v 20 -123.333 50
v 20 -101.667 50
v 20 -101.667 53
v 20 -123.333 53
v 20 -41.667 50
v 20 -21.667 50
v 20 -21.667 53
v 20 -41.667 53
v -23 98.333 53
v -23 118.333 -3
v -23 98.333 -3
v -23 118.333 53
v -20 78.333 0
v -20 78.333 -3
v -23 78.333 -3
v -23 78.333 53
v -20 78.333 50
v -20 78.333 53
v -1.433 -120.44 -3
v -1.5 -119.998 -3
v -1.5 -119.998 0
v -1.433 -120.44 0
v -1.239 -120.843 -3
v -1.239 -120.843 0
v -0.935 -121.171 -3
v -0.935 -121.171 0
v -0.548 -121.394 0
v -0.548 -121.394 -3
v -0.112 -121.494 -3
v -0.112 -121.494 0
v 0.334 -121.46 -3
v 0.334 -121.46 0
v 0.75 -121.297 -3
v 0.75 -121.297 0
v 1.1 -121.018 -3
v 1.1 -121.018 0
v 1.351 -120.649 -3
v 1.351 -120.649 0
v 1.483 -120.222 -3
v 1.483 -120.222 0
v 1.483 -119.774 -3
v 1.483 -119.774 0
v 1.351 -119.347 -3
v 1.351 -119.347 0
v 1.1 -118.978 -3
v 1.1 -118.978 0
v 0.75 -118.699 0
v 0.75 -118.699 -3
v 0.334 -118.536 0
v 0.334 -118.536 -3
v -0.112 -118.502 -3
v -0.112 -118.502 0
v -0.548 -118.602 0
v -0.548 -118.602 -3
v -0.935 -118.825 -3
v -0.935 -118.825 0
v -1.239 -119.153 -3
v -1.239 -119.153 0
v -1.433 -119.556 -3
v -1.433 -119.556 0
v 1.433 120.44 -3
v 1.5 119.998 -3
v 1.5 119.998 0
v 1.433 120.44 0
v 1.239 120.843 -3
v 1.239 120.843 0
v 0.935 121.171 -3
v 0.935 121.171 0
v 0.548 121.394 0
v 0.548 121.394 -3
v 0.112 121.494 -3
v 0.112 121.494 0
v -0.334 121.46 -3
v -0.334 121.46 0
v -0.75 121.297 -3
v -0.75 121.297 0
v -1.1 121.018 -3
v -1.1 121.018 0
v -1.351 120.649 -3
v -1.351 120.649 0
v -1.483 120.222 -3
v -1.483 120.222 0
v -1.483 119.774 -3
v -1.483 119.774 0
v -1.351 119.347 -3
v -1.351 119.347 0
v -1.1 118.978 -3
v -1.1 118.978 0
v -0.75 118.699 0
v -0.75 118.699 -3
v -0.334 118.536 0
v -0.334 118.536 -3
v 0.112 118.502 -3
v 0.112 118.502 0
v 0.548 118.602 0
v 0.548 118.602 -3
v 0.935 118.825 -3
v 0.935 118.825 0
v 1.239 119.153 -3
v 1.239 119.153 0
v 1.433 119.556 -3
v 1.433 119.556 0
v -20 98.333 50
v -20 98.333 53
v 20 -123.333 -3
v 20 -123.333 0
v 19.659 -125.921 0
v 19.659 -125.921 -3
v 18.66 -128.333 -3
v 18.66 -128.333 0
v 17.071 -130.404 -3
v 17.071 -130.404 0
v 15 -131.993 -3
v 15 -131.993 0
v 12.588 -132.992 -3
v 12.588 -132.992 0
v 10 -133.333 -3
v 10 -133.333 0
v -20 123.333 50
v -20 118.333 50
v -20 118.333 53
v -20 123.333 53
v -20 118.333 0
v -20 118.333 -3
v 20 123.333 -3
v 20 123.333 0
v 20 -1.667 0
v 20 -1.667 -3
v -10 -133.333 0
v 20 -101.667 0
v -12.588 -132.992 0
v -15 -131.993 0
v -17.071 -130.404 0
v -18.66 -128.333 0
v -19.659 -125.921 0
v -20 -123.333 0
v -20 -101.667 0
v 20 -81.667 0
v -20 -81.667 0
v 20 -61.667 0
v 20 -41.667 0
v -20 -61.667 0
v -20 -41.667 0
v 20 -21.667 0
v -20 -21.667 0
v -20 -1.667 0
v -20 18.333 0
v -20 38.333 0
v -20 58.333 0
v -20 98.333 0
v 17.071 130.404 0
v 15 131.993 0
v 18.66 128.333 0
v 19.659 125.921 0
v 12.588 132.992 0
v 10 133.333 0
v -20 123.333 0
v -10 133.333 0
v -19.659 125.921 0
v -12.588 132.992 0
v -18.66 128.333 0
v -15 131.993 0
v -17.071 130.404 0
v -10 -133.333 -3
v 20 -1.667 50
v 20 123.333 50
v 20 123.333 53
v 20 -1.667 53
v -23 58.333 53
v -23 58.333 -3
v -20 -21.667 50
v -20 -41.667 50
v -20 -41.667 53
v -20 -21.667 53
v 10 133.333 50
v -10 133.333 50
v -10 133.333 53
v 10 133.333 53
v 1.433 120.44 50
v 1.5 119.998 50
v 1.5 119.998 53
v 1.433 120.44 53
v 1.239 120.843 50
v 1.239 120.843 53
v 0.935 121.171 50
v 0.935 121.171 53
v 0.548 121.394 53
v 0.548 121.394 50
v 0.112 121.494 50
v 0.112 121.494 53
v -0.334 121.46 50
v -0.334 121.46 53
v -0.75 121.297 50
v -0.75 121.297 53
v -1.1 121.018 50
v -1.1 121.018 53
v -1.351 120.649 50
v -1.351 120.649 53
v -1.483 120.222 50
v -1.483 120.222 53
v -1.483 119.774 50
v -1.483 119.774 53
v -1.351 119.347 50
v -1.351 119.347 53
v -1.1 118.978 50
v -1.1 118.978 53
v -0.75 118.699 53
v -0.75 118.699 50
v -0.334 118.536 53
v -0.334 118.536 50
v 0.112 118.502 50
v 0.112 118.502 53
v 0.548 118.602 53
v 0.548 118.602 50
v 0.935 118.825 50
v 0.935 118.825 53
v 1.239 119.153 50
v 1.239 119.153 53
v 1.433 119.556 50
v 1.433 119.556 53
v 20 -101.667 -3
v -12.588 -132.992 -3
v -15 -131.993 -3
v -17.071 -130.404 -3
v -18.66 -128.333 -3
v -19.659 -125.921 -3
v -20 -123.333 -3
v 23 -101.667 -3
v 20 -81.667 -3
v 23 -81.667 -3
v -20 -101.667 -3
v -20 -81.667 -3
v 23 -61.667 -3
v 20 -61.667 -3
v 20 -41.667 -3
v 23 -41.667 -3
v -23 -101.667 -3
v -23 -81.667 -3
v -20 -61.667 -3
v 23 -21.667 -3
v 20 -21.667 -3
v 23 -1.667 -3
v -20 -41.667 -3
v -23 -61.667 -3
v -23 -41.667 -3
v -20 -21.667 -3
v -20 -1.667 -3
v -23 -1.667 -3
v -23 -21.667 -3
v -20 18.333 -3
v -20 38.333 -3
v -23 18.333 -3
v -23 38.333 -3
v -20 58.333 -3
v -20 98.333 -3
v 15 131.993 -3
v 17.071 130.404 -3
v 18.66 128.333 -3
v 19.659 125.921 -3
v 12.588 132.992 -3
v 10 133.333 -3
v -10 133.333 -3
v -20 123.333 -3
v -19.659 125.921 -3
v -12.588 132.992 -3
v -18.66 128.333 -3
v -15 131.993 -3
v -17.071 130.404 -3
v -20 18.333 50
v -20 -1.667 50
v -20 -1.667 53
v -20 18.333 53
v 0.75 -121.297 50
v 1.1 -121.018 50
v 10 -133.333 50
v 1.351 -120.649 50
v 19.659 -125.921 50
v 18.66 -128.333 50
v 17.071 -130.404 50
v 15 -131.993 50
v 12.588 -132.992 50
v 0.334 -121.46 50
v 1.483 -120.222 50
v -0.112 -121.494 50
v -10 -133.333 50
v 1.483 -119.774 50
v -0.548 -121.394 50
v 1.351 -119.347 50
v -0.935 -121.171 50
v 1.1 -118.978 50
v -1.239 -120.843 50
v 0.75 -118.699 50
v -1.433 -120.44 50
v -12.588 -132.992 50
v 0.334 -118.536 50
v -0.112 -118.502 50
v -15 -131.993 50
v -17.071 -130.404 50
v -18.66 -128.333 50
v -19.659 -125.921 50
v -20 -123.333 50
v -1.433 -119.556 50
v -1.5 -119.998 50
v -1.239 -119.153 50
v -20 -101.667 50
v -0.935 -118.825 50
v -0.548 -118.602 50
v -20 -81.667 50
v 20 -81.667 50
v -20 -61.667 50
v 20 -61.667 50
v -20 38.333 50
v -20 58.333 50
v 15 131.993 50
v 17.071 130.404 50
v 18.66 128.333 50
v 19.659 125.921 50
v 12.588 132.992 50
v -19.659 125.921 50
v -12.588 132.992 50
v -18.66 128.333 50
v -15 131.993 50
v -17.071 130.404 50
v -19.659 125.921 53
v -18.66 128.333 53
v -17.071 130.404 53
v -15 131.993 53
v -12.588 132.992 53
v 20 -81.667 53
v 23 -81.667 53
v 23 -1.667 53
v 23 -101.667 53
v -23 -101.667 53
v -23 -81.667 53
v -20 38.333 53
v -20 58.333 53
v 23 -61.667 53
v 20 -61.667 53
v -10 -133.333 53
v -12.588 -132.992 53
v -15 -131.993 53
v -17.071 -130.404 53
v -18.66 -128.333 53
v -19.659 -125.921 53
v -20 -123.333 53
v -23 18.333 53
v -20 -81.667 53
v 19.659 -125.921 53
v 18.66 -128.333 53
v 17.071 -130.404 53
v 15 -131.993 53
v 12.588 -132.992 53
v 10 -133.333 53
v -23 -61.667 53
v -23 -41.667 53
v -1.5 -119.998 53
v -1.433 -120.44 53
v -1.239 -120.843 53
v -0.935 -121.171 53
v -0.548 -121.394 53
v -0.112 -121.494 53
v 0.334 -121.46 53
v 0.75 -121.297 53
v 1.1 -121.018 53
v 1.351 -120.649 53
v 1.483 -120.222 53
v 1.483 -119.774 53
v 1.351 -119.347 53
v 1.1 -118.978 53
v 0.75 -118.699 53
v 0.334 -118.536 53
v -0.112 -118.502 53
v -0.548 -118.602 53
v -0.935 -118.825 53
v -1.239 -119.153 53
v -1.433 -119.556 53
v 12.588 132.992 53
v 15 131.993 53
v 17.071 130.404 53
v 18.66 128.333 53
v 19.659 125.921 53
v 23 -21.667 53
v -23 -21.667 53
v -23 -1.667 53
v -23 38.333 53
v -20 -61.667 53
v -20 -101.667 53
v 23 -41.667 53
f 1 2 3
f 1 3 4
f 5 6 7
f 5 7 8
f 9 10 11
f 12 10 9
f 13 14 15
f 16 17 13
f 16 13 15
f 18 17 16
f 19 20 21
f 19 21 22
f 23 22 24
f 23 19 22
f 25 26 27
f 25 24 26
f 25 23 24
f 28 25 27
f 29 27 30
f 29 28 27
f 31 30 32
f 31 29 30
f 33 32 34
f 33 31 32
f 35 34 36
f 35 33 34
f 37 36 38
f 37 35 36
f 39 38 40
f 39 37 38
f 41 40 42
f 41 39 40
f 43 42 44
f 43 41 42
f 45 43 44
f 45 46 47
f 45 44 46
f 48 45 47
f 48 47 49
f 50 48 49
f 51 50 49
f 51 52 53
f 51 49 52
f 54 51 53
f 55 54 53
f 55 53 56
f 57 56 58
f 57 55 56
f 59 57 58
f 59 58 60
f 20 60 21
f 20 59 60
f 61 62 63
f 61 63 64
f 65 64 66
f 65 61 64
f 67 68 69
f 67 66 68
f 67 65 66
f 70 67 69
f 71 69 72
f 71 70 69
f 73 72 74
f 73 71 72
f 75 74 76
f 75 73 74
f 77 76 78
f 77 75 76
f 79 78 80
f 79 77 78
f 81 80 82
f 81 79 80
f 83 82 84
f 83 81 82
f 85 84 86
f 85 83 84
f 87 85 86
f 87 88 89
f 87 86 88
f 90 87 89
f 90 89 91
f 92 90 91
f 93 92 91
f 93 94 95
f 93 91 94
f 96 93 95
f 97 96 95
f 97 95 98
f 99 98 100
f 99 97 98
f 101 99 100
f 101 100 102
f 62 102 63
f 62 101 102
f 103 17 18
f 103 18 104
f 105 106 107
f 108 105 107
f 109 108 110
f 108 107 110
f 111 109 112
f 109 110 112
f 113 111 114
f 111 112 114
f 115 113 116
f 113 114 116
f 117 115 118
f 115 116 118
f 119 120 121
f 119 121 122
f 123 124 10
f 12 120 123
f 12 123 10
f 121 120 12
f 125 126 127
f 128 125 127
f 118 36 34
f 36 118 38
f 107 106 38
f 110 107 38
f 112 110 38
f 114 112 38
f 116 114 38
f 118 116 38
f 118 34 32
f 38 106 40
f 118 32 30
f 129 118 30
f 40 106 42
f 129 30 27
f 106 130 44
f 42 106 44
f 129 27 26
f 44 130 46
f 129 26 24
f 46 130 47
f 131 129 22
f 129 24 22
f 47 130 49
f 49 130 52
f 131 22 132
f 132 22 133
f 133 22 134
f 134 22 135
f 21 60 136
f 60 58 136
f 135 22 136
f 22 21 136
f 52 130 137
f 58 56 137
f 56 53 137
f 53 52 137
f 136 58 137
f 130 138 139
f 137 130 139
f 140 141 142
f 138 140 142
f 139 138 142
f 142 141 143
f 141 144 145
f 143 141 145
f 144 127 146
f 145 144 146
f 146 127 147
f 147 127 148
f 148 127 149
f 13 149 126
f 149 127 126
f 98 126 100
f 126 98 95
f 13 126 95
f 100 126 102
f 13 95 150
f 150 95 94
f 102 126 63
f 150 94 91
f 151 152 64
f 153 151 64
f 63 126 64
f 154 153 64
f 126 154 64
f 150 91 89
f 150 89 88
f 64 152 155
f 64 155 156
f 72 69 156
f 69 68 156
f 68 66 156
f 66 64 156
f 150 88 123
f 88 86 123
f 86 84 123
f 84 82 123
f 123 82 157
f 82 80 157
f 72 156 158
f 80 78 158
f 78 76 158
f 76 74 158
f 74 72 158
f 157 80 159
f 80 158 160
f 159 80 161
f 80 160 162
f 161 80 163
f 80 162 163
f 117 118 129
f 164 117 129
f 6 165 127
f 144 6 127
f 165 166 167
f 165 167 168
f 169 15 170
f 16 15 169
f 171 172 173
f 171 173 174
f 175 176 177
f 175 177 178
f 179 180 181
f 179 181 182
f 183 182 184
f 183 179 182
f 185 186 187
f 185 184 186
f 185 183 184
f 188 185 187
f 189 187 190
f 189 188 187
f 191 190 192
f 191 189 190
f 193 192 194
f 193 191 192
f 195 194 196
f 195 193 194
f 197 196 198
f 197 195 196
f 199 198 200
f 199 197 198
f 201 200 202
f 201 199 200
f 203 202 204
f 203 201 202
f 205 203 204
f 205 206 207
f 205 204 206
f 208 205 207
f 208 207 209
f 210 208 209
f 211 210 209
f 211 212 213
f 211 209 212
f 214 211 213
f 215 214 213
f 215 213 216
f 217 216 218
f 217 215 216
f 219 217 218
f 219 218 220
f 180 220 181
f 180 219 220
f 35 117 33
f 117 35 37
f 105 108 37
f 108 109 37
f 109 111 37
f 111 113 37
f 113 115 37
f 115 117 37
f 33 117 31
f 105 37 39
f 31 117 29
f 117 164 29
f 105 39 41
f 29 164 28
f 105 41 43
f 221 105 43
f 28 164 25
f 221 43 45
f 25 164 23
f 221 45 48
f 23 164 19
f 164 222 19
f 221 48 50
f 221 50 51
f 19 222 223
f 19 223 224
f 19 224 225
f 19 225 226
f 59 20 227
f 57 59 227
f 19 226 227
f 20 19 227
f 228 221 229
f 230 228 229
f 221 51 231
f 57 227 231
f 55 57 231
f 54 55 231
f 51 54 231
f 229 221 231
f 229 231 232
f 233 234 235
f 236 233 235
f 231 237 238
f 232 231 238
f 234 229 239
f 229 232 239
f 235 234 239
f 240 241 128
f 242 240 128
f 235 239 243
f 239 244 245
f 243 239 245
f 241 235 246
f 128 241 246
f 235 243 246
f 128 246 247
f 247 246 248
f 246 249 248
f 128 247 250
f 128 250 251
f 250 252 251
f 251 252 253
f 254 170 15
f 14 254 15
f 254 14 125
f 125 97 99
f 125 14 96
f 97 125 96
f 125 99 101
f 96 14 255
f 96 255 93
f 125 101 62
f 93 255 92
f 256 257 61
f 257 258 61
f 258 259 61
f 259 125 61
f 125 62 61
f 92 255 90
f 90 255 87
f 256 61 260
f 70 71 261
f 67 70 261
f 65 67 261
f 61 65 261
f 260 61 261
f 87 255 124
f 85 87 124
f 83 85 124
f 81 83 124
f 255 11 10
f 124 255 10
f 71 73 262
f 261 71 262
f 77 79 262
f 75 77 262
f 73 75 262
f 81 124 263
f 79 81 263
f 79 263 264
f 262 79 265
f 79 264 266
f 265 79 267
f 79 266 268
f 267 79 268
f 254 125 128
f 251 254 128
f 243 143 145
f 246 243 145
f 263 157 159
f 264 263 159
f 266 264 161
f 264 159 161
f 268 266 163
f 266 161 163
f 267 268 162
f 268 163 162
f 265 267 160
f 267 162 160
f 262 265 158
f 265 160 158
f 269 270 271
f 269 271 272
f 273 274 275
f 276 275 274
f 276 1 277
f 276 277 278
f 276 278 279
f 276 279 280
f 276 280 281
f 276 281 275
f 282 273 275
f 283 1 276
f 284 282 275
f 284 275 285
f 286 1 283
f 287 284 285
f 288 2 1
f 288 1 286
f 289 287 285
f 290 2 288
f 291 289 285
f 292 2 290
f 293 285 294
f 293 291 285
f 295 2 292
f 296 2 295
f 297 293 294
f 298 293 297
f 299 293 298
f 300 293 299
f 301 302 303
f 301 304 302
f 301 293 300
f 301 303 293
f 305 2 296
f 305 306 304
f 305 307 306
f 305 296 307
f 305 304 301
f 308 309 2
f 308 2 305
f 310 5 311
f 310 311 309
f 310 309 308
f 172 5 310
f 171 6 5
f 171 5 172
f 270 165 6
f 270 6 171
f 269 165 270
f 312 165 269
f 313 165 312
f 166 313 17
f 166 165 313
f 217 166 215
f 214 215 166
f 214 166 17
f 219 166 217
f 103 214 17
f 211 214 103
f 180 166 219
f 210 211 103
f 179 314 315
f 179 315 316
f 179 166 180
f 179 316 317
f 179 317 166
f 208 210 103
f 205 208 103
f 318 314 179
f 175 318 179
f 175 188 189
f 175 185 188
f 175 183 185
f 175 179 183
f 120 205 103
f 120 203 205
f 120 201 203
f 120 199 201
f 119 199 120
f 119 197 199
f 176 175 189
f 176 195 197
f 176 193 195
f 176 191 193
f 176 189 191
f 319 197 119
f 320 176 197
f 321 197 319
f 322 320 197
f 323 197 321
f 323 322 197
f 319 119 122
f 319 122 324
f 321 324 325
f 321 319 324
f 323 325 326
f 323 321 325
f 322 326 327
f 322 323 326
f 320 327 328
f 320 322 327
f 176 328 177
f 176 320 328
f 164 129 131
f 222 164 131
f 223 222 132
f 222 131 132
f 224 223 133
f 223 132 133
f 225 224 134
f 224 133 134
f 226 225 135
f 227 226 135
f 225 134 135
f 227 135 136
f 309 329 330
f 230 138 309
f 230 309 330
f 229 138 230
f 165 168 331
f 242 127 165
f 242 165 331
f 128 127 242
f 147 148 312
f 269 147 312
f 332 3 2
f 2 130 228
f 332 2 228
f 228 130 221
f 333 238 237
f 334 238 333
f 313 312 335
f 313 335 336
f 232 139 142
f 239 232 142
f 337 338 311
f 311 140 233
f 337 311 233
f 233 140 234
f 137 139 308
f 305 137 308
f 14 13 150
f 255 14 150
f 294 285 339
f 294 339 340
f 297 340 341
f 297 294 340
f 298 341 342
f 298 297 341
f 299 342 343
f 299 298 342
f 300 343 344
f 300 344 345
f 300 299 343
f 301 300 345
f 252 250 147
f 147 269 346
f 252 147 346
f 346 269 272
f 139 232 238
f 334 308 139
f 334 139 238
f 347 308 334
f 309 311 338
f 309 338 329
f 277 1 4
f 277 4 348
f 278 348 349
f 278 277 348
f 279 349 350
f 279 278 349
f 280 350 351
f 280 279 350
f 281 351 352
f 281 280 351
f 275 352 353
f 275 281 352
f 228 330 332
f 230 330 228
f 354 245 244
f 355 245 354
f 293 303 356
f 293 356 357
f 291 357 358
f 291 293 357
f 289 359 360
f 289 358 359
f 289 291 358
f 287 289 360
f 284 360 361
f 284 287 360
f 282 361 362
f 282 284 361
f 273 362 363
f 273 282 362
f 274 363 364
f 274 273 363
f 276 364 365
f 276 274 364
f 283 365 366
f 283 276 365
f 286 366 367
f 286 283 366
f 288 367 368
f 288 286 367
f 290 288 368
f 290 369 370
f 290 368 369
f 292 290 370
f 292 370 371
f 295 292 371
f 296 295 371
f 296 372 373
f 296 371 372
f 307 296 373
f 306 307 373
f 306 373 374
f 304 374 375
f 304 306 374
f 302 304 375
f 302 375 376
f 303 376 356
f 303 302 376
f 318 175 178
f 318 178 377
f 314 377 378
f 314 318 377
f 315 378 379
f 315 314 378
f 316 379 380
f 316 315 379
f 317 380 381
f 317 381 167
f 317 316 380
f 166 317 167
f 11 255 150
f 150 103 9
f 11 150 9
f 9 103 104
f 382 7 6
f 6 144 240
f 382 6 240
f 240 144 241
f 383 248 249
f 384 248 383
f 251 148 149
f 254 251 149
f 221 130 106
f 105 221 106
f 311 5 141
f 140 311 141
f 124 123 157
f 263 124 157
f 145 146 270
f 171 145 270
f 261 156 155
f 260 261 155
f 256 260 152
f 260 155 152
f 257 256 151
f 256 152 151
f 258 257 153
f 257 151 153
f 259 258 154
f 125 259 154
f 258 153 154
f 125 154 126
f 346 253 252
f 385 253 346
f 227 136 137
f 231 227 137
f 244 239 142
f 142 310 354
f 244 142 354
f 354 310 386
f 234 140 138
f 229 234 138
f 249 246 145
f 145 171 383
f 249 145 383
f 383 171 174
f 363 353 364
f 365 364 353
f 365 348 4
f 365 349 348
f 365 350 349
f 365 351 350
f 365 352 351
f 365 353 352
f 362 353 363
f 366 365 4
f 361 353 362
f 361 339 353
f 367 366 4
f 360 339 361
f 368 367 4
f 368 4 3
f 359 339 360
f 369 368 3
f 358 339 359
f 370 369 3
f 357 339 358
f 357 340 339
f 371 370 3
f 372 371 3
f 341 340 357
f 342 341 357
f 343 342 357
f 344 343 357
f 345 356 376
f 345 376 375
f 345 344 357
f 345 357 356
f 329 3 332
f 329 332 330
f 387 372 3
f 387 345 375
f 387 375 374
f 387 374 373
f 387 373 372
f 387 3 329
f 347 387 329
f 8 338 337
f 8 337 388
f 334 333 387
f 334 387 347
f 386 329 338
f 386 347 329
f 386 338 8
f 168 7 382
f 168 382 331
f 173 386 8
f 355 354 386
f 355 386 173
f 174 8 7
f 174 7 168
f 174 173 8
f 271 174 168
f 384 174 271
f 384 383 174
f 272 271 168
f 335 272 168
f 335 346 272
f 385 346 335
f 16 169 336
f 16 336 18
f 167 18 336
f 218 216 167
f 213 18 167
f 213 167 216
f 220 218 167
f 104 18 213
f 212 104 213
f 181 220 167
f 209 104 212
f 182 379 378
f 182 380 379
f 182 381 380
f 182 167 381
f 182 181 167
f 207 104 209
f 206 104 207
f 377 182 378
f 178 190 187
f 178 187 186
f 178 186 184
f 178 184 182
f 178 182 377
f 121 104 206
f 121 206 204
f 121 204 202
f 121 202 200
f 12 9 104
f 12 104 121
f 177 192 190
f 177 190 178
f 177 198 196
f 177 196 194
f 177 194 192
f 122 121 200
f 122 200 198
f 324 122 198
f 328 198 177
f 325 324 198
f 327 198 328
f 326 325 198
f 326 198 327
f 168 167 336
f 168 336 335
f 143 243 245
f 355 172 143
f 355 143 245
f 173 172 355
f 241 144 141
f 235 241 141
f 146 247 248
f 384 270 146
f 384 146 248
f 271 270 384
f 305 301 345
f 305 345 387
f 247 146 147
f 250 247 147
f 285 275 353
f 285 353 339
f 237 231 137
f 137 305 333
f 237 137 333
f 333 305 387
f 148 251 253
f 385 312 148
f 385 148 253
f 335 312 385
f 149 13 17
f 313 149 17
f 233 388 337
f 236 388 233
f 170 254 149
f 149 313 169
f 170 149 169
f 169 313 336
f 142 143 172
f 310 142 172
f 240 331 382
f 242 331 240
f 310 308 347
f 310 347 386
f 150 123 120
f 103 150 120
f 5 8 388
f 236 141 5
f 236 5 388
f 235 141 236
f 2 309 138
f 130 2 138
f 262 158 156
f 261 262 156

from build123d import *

# Parameters (mm, degrees)
BOSS_EXTRUDE1_START     = 50
BOSS_EXTRUDE1_DEPTH     = 3
BOSS_EXTRUDE2_DEPTH     = 3
CUT_EXTRUDE1_DEPTH      = 145.867832485
CUT_EXTRUDE1_DEPTH_BACK = 145.867832485
SKETCH2_R               = 1.5
SKETCH3_W               = 56
SKETCH3_H               = 20
BOSS_EXTRUDE4_DEPTH     = 3
SKETCH4_W               = 56
SKETCH4_H               = 20
BOSS_EXTRUDE5_DEPTH     = 3


with BuildPart() as part:
    # Sketch1 → Boss-Extrude1 (new body)
    with BuildSketch(Plane.XY.offset(BOSS_EXTRUDE1_START)):
        with BuildLine():
            Line((-10, 133.333), (10, 133.333))
            ThreePointArc((10, 133.333), (17.071067812, 130.404067812), (20, 123.333))
            Line((20, 123.333), (20, -123.333))
            ThreePointArc((20, -123.333), (17.071067812, -130.404067812), (10, -133.333))
            Line((10, -133.333), (-10, -133.333))
            ThreePointArc((-10, -133.333), (-17.071067812, -130.404067812), (-20, -123.333))
            Line((-20, -123.333), (-20, 123.333))
            ThreePointArc((-20, 123.333), (-17.071067812, 130.404067812), (-10, 133.333))
        make_face()
    extrude(amount=BOSS_EXTRUDE1_DEPTH)


with BuildPart() as body_2:
    # Sketch1<3> → Boss-Extrude2 (new body)
    with BuildSketch(Plane.XY):
        with BuildLine():
            Line((-10, 133.333), (10, 133.333))
            ThreePointArc((10, 133.333), (17.071067812, 130.404067812), (20, 123.333))
            Line((20, 123.333), (20, -123.333))
            ThreePointArc((20, -123.333), (17.071067812, -130.404067812), (10, -133.333))
            Line((10, -133.333), (-10, -133.333))
            ThreePointArc((-10, -133.333), (-17.071067812, -130.404067812), (-20, -123.333))
            Line((-20, -123.333), (-20, 123.333))
            ThreePointArc((-20, 123.333), (-17.071067812, 130.404067812), (-10, 133.333))
        make_face()
    extrude(amount=-BOSS_EXTRUDE2_DEPTH)


with BuildPart() as cut_extrude1_tool:
    # Sketch2 → Cut-Extrude1 (new, two sides: drawn at the far end of the back side and taken through both)
    with BuildSketch(Plane.XY.offset(-CUT_EXTRUDE1_DEPTH_BACK)):
        with Locations((0, 119.997946932)):
            Circle(SKETCH2_R)
        with Locations((0, -119.997946932)):
            Circle(SKETCH2_R)
    extrude(amount=CUT_EXTRUDE1_DEPTH + CUT_EXTRUDE1_DEPTH_BACK)


with BuildPart() as part_1:
    add(part.part)

    # Cut-Extrude1: cut by cut_extrude1_tool
    add(cut_extrude1_tool.part, mode=Mode.SUBTRACT)



with BuildPart() as body_2_1:
    add(body_2.part)

    # Cut-Extrude1: cut by cut_extrude1_tool
    add(cut_extrude1_tool.part, mode=Mode.SUBTRACT)


with BuildPart() as part_2:
    add(part_1.part)

    add(body_2_1.part)  # Boss-Extrude4 merges body 2
    # Sketch3 → Boss-Extrude4 (add)
    with BuildSketch(Plane.ZY.offset(20)):
        with Locations((25, 108.333)):
            Rectangle(SKETCH3_W, SKETCH3_H)
        with Locations((25, 68.333)):
            Rectangle(SKETCH3_W, SKETCH3_H)
        with Locations((25, 28.333)):
            Rectangle(SKETCH3_W, SKETCH3_H)
        with Locations((25, -11.667)):
            Rectangle(SKETCH3_W, SKETCH3_H)
        with Locations((25, -51.667)):
            Rectangle(SKETCH3_W, SKETCH3_H)
        with Locations((25, -91.667)):
            Rectangle(SKETCH3_W, SKETCH3_H)
    extrude(amount=BOSS_EXTRUDE4_DEPTH)

    # Sketch4 → Boss-Extrude5 (add)
    with BuildSketch(Plane(origin=(20, 0, 0), x_dir=(0, 0, -1), z_dir=(1, 0, 0))):
        with Locations((-25, -51.667)):
            Rectangle(SKETCH4_W, SKETCH4_H)
        with Locations((-25, -11.667)):
            Rectangle(SKETCH4_W, SKETCH4_H)
        with Locations((-25, -91.667)):
            Rectangle(SKETCH4_W, SKETCH4_H)
    extrude(amount=BOSS_EXTRUDE5_DEPTH)


solid = part_2.part
